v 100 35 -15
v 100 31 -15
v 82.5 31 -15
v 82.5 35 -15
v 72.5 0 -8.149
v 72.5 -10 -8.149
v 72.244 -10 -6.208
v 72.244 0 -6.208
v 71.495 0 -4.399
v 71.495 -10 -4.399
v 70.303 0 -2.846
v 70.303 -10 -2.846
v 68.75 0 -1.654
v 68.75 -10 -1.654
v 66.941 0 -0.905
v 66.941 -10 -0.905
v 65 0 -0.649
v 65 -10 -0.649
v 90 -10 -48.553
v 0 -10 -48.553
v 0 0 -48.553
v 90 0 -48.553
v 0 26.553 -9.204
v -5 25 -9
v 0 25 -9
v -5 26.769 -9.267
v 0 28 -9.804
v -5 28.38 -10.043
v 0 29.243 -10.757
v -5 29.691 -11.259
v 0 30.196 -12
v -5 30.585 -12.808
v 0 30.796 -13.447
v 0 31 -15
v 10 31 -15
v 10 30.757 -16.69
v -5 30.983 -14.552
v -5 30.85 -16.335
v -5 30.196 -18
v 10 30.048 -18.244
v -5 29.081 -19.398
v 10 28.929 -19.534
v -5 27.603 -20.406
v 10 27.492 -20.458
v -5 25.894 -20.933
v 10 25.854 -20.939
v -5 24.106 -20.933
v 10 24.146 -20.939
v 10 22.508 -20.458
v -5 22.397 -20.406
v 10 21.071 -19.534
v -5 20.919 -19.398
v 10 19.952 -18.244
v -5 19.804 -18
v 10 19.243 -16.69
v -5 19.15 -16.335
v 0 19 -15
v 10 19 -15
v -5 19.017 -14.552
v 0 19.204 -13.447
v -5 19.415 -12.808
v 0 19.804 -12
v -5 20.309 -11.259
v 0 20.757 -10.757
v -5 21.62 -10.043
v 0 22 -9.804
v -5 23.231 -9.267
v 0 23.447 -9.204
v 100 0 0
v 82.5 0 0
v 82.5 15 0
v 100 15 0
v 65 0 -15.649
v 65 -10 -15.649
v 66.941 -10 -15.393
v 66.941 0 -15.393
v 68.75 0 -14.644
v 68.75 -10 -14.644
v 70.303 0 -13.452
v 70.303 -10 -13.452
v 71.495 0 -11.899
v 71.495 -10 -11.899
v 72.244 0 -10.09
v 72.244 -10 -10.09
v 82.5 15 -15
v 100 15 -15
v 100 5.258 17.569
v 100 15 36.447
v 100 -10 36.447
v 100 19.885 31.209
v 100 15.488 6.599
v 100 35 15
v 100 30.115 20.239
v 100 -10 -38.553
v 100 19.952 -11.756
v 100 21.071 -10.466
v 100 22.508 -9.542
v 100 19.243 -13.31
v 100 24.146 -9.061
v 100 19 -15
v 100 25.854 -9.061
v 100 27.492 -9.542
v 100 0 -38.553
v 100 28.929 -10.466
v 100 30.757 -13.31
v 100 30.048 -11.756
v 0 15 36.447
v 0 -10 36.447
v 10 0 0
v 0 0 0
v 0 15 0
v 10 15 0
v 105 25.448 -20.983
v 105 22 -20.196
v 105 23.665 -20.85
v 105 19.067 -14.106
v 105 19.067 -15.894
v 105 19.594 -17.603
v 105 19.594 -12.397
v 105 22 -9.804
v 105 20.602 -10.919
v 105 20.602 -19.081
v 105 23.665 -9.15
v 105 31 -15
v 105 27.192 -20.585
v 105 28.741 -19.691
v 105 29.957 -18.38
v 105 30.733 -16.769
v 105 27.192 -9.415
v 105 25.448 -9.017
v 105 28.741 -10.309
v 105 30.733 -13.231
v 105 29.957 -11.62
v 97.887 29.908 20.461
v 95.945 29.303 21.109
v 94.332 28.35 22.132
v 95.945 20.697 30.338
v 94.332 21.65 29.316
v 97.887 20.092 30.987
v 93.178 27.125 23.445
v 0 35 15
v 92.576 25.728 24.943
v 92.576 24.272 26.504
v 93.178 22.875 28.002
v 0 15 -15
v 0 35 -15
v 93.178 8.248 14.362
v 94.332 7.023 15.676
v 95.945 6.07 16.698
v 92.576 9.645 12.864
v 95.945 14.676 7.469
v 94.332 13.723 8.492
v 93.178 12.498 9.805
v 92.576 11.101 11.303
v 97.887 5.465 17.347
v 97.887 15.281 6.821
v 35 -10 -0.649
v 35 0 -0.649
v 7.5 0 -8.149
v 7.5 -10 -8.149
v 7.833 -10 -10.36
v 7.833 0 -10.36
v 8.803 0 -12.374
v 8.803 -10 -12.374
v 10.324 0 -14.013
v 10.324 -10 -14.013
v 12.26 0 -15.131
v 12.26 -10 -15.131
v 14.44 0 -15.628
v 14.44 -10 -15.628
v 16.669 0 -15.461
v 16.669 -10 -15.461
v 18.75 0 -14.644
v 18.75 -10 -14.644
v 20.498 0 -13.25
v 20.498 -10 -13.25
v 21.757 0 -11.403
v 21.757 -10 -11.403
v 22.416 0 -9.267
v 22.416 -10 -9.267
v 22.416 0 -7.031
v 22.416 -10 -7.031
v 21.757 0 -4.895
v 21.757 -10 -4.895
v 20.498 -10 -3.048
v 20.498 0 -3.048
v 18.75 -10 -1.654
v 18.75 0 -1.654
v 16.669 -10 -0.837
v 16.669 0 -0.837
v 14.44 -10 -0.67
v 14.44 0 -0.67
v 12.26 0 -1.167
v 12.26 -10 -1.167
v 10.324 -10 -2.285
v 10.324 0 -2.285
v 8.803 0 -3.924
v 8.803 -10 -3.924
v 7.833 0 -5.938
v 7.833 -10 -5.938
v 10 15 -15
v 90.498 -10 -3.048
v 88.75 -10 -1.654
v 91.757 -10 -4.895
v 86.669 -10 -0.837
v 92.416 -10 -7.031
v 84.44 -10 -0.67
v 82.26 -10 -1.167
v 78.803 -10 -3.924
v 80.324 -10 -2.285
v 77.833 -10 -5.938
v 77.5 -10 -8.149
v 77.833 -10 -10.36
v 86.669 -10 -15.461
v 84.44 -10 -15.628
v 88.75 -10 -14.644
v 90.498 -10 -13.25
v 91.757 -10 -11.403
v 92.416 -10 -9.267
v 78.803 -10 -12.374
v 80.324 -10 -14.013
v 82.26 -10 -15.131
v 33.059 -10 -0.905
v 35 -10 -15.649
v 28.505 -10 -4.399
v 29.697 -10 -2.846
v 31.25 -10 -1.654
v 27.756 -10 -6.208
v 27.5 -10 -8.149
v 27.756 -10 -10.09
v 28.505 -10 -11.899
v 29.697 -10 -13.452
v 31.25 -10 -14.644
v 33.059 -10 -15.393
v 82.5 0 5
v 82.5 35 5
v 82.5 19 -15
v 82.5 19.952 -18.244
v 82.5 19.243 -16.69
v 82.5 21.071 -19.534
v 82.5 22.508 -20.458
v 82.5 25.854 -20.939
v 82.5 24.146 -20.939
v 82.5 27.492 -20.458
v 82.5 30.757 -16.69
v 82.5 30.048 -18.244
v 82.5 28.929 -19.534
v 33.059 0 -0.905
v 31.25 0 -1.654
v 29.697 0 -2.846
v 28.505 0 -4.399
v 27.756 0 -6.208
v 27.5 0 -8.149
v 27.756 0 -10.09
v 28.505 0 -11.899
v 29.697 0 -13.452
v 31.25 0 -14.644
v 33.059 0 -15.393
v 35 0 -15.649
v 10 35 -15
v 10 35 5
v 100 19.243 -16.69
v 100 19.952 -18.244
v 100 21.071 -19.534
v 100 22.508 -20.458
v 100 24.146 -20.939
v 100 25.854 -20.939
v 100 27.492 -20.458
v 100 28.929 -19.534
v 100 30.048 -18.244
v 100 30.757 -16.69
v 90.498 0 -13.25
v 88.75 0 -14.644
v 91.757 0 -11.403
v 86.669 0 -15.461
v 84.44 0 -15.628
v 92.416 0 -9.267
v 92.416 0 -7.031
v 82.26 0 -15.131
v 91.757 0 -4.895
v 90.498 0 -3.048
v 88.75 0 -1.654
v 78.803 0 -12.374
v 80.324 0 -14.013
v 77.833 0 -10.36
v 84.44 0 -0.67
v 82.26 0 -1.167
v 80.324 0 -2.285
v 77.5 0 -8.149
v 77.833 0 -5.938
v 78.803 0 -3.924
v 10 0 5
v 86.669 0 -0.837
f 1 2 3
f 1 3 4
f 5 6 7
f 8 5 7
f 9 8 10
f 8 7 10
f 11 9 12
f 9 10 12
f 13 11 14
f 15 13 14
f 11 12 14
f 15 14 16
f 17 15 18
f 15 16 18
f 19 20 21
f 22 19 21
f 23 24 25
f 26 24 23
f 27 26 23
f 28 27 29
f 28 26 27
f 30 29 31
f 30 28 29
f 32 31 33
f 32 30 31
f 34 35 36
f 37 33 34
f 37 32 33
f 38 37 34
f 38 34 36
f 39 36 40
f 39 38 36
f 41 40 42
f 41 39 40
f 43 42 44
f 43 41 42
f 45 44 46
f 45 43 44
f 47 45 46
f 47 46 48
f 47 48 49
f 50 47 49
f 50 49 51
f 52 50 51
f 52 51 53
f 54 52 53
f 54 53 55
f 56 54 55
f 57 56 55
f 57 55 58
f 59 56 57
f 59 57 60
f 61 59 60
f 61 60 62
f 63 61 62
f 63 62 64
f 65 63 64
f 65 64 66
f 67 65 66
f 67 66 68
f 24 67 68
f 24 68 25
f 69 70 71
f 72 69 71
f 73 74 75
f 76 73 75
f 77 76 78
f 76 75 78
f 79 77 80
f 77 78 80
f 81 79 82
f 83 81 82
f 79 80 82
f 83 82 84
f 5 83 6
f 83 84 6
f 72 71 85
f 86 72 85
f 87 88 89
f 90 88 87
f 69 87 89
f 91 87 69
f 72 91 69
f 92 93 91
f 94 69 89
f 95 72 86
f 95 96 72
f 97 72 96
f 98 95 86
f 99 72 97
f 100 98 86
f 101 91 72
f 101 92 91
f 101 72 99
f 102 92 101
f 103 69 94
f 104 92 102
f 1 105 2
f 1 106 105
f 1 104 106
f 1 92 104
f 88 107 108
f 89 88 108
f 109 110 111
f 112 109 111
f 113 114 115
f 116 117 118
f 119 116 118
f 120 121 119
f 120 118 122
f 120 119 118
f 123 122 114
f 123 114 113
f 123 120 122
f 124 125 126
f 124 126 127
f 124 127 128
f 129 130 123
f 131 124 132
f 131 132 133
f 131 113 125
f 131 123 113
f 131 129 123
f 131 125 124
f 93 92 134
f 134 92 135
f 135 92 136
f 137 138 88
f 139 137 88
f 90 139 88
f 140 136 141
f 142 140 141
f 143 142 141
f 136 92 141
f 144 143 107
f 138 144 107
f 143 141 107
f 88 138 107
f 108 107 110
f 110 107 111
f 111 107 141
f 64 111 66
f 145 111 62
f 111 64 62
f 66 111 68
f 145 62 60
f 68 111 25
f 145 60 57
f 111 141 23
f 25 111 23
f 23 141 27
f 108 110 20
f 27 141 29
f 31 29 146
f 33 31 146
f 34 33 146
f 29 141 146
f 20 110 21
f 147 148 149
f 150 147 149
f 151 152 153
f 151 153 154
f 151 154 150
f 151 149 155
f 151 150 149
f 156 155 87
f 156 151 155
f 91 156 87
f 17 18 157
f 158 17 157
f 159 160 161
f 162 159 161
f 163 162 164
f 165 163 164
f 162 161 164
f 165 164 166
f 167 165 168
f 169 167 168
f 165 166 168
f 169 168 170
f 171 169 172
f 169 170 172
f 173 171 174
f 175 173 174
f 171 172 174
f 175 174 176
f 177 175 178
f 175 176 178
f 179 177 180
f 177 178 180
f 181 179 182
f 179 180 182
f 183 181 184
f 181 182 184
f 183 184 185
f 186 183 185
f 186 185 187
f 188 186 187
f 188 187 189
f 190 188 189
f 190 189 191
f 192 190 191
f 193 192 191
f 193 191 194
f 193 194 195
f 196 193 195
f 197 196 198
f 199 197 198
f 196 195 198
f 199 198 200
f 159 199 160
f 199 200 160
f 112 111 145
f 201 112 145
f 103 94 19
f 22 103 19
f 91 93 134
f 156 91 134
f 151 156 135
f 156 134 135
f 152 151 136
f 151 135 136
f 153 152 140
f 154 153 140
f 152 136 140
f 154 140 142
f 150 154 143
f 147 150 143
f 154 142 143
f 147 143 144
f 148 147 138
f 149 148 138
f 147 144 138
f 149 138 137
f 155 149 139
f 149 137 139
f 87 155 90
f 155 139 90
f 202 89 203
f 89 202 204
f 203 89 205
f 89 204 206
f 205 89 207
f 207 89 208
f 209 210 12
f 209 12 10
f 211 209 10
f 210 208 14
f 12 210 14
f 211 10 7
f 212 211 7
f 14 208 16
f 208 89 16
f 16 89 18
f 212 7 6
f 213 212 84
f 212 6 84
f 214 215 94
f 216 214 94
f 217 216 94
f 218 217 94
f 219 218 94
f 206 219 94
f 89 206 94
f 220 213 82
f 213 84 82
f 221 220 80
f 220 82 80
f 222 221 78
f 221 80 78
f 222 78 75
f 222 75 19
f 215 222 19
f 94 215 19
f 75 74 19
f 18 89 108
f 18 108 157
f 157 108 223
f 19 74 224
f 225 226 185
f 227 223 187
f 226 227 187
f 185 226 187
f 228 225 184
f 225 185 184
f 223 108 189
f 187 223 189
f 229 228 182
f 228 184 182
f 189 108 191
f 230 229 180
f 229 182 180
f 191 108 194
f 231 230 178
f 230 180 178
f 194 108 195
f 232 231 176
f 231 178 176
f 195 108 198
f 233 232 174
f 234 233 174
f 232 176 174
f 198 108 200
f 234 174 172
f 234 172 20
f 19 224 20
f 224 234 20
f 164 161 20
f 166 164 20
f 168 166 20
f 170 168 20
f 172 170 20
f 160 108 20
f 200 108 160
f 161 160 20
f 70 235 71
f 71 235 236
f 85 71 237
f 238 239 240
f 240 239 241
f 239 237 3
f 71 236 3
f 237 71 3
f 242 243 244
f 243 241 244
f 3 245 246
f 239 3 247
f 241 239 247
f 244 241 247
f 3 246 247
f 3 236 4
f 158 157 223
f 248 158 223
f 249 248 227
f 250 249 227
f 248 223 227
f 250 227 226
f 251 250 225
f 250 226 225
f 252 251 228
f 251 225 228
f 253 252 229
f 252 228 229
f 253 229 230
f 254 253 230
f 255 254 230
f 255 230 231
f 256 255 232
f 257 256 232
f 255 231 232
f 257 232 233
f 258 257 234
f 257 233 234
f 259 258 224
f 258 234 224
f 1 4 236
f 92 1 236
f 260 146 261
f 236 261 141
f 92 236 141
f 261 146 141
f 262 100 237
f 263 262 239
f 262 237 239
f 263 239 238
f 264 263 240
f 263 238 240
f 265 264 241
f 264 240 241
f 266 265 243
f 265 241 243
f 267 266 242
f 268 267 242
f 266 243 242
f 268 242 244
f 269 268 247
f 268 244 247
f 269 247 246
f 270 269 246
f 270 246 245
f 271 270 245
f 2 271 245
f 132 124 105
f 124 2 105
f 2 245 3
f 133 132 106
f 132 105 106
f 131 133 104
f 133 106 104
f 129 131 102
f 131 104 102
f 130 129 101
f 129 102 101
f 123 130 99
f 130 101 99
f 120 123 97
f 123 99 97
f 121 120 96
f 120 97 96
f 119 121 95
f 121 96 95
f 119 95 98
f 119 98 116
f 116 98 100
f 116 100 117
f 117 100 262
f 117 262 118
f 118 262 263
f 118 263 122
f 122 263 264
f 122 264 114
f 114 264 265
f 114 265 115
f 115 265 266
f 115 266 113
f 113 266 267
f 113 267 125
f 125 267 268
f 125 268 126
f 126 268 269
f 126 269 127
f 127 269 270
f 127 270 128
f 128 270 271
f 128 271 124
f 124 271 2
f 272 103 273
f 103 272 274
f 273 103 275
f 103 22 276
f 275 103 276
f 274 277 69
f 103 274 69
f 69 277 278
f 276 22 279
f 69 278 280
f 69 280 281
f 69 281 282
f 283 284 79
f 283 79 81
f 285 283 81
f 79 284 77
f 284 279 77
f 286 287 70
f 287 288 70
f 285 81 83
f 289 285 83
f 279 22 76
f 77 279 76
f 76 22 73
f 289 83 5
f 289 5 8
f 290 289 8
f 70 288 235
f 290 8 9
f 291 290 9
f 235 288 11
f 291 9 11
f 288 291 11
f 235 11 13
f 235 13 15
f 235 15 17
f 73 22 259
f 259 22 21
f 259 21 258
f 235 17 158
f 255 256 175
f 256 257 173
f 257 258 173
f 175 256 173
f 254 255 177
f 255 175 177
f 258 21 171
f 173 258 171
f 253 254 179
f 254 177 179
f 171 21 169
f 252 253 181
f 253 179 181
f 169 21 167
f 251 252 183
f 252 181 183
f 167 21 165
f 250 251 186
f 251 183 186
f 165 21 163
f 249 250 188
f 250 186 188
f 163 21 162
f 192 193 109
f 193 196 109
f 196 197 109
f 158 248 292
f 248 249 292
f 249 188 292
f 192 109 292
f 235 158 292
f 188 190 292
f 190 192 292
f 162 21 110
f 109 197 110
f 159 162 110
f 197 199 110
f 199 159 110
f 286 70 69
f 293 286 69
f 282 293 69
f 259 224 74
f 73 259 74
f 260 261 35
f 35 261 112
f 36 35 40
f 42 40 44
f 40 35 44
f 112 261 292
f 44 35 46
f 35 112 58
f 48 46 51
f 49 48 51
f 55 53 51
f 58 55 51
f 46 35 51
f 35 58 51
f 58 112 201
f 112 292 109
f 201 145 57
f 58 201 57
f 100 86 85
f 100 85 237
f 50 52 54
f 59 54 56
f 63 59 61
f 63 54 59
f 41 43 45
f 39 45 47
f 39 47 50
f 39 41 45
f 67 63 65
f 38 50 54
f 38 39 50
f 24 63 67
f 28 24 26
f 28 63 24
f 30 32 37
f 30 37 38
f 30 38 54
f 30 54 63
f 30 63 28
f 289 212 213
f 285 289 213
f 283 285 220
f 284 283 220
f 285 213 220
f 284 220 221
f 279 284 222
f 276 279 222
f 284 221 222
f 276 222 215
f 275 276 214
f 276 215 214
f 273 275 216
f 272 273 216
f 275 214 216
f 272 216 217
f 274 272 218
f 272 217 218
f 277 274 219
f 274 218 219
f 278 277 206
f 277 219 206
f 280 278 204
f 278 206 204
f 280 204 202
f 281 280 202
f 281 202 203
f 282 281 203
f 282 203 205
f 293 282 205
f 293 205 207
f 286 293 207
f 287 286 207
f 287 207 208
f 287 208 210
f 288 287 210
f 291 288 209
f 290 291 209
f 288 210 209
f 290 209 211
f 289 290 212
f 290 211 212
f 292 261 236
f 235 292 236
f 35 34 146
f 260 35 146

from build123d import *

# Parameters (mm, degrees)
ESQUISSE1_R             = 6
BOSS_EXTRU_1_DEPTH      = 100
ESQUISSE2_R             = 6
BOSS_EXTRU_2_DEPTH      = 5
BOSS_EXTRU_3_START      = 5
ESQUISSE3_R             = 6
BOSS_EXTRU_3_DEPTH      = 5
ENL_V_MAT_EXTRU_1_DEPTH = 20
ENL_V_MAT_EXTRU_3_REACH = 126.126
ESQUISSE5_W             = 72.5
ESQUISSE5_H             = 20
ESQUISSE6_W             = 72.5
ESQUISSE6_H             = 6
ENL_V_MAT_EXTRU_4_DEPTH = 40
ENL_V_MAT_EXTRU_5_DEPTH = 10
ENL_V_MAT_EXTRU_6_DEPTH = 10


with BuildPart() as part:
    # Esquisse1 → Boss.-Extru.1 (new body)
    with BuildSketch(Plane(origin=(0, 0, 0), x_dir=(0, 0, -1), z_dir=(1, 0, 0))):
        with BuildLine():
            Line((48.5526258, 0), (0, 0))
            Line((0, 0), (0, 15))
            Line((0, 15), (15, 15))
            Line((15, 15), (15, 19))
            ThreePointArc((15, 19), (9, 25), (15, 31))
            Line((15, 31), (15, 35))
            Line((15, 35), (-15, 35))
            Line((-15, 35), (-36.4473742, 15))
            Line((-36.4473742, 15), (-36.4473742, -10))
            Line((-36.4473742, -10), (48.5526258, -10))
            Line((48.5526258, -10), (48.5526258, 0))
        make_face()
        with Locations((15, 25)):
            Circle(ESQUISSE1_R)
    extrude(amount=BOSS_EXTRU_1_DEPTH)

    # Esquisse2 → Boss.-Extru.2 (add)
    with BuildSketch(Plane(origin=(100, 0, 0), x_dir=(0, 0, -1), z_dir=(1, 0, 0))):
        with Locations(Location((15, 25, 0), (0, 0, 90))):
            Circle(ESQUISSE2_R)
    extrude(amount=BOSS_EXTRU_2_DEPTH)

    # Esquisse3 → Boss.-Extru.3 (add)
    with BuildSketch(Plane.ZY.offset(BOSS_EXTRU_3_START)):
        with Locations((-15, 25)):
            Circle(ESQUISSE3_R)
    extrude(amount=-BOSS_EXTRU_3_DEPTH)

    # Esquisse4 → Enlèv. mat.-Extru.1 (cut)
    with BuildSketch(Plane(origin=(0, 26.202468667, 24.434197326), x_dir=(1, 0, 0), z_dir=(0, 0.7313537016191716, 0.6819983600624975))):
        with BuildLine():
            ThreePointArc((107.5, -1.763154778), (105.303300859, 3.54014608), (100, 5.736845222))
            Line((100, 5.736845222), (100, -1.763154778))
            Line((100, -1.763154778), (100, -9.263154778))
            ThreePointArc((100, -9.263154778), (105.303300859, -7.066455637), (107.5, -1.763154778))
        make_face()
        with BuildLine():
            Line((100, -1.763154778), (100, 5.736845222))
            ThreePointArc((100, 5.736845222), (92.5, -1.763154778), (100, -9.263154778))
            Line((100, -9.263154778), (100, -1.763154778))
        make_face()
    extrude(amount=-ENL_V_MAT_EXTRU_1_DEPTH, mode=Mode.SUBTRACT)

    # Enlèv. mat.-Extru.3: up to this face of the body (flat: up to its plane)
    enl_v_mat_extru_3_end = Plane(part.part.faces().sort_by_distance((50, 0, -24.2763129))[0])
    # Esquisse5 → Enlèv. mat.-Extru.3 (cut, up to the picked face)
    with BuildSketch(Plane(origin=(0, 35, 0), x_dir=(1, 0, 0), z_dir=(0, 1, 0)), mode=Mode.PRIVATE) as enl_v_mat_extru_3_sk1:
        with Locations((46.25, 5)):
            Rectangle(ESQUISSE5_W, ESQUISSE5_H)
    enl_v_mat_extru_3_tool1 = split(extrude(enl_v_mat_extru_3_sk1.sketch, amount=-ENL_V_MAT_EXTRU_3_REACH, mode=Mode.PRIVATE), bisect_by=enl_v_mat_extru_3_end, keep=Keep.BOTH, mode=Mode.PRIVATE)
    add(enl_v_mat_extru_3_tool1.solids().sort_by(Axis((46.25, 35, -5), (0, -1, 0)))[0], mode=Mode.SUBTRACT)

    # Esquisse6 → Enlèv. mat.-Extru.4 (cut)
    with BuildSketch(Plane(origin=(0, 0, 0), x_dir=(1, 0, 0), z_dir=(0, 1, 0))):
        with Locations((46.25, 18)):
            Rectangle(ESQUISSE6_W, ESQUISSE6_H)
    extrude(amount=ENL_V_MAT_EXTRU_4_DEPTH, mode=Mode.SUBTRACT)

    # Esquisse7 → Enlèv. mat.-Extru.5 (cut)
    with BuildSketch(Plane.XZ.offset(10)):
        with BuildLine():
            ThreePointArc((22.5, -8.148997132), (15, -0.648997132), (7.5, -8.148997132))
            Line((7.5, -8.148997132), (15, -8.148997132))
            Line((15, -8.148997132), (22.5, -8.148997132))
        make_face()
        with BuildLine():
            Line((15, -8.148997132), (7.5, -8.148997132))
            ThreePointArc((7.5, -8.148997132), (15, -15.648997132), (22.5, -8.148997132))
            Line((22.5, -8.148997132), (15, -8.148997132))
        make_face()
        with BuildLine():
            ThreePointArc((35, -0.648997132), (29.696699141, -2.845696273), (27.5, -8.148997132))
            Line((27.5, -8.148997132), (35, -8.148997132))
            Line((35, -8.148997132), (65, -8.148997132))
            Line((65, -8.148997132), (72.5, -8.148997132))
            ThreePointArc((72.5, -8.148997132), (70.303300859, -2.845696273), (65, -0.648997132))
            Line((65, -0.648997132), (35, -0.648997132))
        make_face()
        with BuildLine():
            Line((35, -8.148997132), (27.5, -8.148997132))
            ThreePointArc((27.5, -8.148997132), (29.696699141, -13.452297991), (35, -15.648997132))
            Line((35, -15.648997132), (65, -15.648997132))
            ThreePointArc((65, -15.648997132), (70.303300859, -13.452297991), (72.5, -8.148997132))
            Line((72.5, -8.148997132), (65, -8.148997132))
            Line((65, -8.148997132), (35, -8.148997132))
        make_face()
        with BuildLine():
            ThreePointArc((92.5, -8.148997132), (85, -0.648997132), (77.5, -8.148997132))
            Line((77.5, -8.148997132), (85, -8.148997132))
            Line((85, -8.148997132), (92.5, -8.148997132))
        make_face()
        with BuildLine():
            Line((85, -8.148997132), (77.5, -8.148997132))
            ThreePointArc((77.5, -8.148997132), (85, -15.648997132), (92.5, -8.148997132))
            Line((92.5, -8.148997132), (85, -8.148997132))
        make_face()
    extrude(amount=-ENL_V_MAT_EXTRU_5_DEPTH, mode=Mode.SUBTRACT)

    # Esquisse8 → Enlèv. mat.-Extru.6 (cut)
    with BuildSketch(Plane.XZ.offset(10)):
        Polygon((100, -48.5526258), (100, -38.5526258), (90, -48.5526258), align=None)
    extrude(amount=-ENL_V_MAT_EXTRU_6_DEPTH, mode=Mode.SUBTRACT)


solid = part.part
